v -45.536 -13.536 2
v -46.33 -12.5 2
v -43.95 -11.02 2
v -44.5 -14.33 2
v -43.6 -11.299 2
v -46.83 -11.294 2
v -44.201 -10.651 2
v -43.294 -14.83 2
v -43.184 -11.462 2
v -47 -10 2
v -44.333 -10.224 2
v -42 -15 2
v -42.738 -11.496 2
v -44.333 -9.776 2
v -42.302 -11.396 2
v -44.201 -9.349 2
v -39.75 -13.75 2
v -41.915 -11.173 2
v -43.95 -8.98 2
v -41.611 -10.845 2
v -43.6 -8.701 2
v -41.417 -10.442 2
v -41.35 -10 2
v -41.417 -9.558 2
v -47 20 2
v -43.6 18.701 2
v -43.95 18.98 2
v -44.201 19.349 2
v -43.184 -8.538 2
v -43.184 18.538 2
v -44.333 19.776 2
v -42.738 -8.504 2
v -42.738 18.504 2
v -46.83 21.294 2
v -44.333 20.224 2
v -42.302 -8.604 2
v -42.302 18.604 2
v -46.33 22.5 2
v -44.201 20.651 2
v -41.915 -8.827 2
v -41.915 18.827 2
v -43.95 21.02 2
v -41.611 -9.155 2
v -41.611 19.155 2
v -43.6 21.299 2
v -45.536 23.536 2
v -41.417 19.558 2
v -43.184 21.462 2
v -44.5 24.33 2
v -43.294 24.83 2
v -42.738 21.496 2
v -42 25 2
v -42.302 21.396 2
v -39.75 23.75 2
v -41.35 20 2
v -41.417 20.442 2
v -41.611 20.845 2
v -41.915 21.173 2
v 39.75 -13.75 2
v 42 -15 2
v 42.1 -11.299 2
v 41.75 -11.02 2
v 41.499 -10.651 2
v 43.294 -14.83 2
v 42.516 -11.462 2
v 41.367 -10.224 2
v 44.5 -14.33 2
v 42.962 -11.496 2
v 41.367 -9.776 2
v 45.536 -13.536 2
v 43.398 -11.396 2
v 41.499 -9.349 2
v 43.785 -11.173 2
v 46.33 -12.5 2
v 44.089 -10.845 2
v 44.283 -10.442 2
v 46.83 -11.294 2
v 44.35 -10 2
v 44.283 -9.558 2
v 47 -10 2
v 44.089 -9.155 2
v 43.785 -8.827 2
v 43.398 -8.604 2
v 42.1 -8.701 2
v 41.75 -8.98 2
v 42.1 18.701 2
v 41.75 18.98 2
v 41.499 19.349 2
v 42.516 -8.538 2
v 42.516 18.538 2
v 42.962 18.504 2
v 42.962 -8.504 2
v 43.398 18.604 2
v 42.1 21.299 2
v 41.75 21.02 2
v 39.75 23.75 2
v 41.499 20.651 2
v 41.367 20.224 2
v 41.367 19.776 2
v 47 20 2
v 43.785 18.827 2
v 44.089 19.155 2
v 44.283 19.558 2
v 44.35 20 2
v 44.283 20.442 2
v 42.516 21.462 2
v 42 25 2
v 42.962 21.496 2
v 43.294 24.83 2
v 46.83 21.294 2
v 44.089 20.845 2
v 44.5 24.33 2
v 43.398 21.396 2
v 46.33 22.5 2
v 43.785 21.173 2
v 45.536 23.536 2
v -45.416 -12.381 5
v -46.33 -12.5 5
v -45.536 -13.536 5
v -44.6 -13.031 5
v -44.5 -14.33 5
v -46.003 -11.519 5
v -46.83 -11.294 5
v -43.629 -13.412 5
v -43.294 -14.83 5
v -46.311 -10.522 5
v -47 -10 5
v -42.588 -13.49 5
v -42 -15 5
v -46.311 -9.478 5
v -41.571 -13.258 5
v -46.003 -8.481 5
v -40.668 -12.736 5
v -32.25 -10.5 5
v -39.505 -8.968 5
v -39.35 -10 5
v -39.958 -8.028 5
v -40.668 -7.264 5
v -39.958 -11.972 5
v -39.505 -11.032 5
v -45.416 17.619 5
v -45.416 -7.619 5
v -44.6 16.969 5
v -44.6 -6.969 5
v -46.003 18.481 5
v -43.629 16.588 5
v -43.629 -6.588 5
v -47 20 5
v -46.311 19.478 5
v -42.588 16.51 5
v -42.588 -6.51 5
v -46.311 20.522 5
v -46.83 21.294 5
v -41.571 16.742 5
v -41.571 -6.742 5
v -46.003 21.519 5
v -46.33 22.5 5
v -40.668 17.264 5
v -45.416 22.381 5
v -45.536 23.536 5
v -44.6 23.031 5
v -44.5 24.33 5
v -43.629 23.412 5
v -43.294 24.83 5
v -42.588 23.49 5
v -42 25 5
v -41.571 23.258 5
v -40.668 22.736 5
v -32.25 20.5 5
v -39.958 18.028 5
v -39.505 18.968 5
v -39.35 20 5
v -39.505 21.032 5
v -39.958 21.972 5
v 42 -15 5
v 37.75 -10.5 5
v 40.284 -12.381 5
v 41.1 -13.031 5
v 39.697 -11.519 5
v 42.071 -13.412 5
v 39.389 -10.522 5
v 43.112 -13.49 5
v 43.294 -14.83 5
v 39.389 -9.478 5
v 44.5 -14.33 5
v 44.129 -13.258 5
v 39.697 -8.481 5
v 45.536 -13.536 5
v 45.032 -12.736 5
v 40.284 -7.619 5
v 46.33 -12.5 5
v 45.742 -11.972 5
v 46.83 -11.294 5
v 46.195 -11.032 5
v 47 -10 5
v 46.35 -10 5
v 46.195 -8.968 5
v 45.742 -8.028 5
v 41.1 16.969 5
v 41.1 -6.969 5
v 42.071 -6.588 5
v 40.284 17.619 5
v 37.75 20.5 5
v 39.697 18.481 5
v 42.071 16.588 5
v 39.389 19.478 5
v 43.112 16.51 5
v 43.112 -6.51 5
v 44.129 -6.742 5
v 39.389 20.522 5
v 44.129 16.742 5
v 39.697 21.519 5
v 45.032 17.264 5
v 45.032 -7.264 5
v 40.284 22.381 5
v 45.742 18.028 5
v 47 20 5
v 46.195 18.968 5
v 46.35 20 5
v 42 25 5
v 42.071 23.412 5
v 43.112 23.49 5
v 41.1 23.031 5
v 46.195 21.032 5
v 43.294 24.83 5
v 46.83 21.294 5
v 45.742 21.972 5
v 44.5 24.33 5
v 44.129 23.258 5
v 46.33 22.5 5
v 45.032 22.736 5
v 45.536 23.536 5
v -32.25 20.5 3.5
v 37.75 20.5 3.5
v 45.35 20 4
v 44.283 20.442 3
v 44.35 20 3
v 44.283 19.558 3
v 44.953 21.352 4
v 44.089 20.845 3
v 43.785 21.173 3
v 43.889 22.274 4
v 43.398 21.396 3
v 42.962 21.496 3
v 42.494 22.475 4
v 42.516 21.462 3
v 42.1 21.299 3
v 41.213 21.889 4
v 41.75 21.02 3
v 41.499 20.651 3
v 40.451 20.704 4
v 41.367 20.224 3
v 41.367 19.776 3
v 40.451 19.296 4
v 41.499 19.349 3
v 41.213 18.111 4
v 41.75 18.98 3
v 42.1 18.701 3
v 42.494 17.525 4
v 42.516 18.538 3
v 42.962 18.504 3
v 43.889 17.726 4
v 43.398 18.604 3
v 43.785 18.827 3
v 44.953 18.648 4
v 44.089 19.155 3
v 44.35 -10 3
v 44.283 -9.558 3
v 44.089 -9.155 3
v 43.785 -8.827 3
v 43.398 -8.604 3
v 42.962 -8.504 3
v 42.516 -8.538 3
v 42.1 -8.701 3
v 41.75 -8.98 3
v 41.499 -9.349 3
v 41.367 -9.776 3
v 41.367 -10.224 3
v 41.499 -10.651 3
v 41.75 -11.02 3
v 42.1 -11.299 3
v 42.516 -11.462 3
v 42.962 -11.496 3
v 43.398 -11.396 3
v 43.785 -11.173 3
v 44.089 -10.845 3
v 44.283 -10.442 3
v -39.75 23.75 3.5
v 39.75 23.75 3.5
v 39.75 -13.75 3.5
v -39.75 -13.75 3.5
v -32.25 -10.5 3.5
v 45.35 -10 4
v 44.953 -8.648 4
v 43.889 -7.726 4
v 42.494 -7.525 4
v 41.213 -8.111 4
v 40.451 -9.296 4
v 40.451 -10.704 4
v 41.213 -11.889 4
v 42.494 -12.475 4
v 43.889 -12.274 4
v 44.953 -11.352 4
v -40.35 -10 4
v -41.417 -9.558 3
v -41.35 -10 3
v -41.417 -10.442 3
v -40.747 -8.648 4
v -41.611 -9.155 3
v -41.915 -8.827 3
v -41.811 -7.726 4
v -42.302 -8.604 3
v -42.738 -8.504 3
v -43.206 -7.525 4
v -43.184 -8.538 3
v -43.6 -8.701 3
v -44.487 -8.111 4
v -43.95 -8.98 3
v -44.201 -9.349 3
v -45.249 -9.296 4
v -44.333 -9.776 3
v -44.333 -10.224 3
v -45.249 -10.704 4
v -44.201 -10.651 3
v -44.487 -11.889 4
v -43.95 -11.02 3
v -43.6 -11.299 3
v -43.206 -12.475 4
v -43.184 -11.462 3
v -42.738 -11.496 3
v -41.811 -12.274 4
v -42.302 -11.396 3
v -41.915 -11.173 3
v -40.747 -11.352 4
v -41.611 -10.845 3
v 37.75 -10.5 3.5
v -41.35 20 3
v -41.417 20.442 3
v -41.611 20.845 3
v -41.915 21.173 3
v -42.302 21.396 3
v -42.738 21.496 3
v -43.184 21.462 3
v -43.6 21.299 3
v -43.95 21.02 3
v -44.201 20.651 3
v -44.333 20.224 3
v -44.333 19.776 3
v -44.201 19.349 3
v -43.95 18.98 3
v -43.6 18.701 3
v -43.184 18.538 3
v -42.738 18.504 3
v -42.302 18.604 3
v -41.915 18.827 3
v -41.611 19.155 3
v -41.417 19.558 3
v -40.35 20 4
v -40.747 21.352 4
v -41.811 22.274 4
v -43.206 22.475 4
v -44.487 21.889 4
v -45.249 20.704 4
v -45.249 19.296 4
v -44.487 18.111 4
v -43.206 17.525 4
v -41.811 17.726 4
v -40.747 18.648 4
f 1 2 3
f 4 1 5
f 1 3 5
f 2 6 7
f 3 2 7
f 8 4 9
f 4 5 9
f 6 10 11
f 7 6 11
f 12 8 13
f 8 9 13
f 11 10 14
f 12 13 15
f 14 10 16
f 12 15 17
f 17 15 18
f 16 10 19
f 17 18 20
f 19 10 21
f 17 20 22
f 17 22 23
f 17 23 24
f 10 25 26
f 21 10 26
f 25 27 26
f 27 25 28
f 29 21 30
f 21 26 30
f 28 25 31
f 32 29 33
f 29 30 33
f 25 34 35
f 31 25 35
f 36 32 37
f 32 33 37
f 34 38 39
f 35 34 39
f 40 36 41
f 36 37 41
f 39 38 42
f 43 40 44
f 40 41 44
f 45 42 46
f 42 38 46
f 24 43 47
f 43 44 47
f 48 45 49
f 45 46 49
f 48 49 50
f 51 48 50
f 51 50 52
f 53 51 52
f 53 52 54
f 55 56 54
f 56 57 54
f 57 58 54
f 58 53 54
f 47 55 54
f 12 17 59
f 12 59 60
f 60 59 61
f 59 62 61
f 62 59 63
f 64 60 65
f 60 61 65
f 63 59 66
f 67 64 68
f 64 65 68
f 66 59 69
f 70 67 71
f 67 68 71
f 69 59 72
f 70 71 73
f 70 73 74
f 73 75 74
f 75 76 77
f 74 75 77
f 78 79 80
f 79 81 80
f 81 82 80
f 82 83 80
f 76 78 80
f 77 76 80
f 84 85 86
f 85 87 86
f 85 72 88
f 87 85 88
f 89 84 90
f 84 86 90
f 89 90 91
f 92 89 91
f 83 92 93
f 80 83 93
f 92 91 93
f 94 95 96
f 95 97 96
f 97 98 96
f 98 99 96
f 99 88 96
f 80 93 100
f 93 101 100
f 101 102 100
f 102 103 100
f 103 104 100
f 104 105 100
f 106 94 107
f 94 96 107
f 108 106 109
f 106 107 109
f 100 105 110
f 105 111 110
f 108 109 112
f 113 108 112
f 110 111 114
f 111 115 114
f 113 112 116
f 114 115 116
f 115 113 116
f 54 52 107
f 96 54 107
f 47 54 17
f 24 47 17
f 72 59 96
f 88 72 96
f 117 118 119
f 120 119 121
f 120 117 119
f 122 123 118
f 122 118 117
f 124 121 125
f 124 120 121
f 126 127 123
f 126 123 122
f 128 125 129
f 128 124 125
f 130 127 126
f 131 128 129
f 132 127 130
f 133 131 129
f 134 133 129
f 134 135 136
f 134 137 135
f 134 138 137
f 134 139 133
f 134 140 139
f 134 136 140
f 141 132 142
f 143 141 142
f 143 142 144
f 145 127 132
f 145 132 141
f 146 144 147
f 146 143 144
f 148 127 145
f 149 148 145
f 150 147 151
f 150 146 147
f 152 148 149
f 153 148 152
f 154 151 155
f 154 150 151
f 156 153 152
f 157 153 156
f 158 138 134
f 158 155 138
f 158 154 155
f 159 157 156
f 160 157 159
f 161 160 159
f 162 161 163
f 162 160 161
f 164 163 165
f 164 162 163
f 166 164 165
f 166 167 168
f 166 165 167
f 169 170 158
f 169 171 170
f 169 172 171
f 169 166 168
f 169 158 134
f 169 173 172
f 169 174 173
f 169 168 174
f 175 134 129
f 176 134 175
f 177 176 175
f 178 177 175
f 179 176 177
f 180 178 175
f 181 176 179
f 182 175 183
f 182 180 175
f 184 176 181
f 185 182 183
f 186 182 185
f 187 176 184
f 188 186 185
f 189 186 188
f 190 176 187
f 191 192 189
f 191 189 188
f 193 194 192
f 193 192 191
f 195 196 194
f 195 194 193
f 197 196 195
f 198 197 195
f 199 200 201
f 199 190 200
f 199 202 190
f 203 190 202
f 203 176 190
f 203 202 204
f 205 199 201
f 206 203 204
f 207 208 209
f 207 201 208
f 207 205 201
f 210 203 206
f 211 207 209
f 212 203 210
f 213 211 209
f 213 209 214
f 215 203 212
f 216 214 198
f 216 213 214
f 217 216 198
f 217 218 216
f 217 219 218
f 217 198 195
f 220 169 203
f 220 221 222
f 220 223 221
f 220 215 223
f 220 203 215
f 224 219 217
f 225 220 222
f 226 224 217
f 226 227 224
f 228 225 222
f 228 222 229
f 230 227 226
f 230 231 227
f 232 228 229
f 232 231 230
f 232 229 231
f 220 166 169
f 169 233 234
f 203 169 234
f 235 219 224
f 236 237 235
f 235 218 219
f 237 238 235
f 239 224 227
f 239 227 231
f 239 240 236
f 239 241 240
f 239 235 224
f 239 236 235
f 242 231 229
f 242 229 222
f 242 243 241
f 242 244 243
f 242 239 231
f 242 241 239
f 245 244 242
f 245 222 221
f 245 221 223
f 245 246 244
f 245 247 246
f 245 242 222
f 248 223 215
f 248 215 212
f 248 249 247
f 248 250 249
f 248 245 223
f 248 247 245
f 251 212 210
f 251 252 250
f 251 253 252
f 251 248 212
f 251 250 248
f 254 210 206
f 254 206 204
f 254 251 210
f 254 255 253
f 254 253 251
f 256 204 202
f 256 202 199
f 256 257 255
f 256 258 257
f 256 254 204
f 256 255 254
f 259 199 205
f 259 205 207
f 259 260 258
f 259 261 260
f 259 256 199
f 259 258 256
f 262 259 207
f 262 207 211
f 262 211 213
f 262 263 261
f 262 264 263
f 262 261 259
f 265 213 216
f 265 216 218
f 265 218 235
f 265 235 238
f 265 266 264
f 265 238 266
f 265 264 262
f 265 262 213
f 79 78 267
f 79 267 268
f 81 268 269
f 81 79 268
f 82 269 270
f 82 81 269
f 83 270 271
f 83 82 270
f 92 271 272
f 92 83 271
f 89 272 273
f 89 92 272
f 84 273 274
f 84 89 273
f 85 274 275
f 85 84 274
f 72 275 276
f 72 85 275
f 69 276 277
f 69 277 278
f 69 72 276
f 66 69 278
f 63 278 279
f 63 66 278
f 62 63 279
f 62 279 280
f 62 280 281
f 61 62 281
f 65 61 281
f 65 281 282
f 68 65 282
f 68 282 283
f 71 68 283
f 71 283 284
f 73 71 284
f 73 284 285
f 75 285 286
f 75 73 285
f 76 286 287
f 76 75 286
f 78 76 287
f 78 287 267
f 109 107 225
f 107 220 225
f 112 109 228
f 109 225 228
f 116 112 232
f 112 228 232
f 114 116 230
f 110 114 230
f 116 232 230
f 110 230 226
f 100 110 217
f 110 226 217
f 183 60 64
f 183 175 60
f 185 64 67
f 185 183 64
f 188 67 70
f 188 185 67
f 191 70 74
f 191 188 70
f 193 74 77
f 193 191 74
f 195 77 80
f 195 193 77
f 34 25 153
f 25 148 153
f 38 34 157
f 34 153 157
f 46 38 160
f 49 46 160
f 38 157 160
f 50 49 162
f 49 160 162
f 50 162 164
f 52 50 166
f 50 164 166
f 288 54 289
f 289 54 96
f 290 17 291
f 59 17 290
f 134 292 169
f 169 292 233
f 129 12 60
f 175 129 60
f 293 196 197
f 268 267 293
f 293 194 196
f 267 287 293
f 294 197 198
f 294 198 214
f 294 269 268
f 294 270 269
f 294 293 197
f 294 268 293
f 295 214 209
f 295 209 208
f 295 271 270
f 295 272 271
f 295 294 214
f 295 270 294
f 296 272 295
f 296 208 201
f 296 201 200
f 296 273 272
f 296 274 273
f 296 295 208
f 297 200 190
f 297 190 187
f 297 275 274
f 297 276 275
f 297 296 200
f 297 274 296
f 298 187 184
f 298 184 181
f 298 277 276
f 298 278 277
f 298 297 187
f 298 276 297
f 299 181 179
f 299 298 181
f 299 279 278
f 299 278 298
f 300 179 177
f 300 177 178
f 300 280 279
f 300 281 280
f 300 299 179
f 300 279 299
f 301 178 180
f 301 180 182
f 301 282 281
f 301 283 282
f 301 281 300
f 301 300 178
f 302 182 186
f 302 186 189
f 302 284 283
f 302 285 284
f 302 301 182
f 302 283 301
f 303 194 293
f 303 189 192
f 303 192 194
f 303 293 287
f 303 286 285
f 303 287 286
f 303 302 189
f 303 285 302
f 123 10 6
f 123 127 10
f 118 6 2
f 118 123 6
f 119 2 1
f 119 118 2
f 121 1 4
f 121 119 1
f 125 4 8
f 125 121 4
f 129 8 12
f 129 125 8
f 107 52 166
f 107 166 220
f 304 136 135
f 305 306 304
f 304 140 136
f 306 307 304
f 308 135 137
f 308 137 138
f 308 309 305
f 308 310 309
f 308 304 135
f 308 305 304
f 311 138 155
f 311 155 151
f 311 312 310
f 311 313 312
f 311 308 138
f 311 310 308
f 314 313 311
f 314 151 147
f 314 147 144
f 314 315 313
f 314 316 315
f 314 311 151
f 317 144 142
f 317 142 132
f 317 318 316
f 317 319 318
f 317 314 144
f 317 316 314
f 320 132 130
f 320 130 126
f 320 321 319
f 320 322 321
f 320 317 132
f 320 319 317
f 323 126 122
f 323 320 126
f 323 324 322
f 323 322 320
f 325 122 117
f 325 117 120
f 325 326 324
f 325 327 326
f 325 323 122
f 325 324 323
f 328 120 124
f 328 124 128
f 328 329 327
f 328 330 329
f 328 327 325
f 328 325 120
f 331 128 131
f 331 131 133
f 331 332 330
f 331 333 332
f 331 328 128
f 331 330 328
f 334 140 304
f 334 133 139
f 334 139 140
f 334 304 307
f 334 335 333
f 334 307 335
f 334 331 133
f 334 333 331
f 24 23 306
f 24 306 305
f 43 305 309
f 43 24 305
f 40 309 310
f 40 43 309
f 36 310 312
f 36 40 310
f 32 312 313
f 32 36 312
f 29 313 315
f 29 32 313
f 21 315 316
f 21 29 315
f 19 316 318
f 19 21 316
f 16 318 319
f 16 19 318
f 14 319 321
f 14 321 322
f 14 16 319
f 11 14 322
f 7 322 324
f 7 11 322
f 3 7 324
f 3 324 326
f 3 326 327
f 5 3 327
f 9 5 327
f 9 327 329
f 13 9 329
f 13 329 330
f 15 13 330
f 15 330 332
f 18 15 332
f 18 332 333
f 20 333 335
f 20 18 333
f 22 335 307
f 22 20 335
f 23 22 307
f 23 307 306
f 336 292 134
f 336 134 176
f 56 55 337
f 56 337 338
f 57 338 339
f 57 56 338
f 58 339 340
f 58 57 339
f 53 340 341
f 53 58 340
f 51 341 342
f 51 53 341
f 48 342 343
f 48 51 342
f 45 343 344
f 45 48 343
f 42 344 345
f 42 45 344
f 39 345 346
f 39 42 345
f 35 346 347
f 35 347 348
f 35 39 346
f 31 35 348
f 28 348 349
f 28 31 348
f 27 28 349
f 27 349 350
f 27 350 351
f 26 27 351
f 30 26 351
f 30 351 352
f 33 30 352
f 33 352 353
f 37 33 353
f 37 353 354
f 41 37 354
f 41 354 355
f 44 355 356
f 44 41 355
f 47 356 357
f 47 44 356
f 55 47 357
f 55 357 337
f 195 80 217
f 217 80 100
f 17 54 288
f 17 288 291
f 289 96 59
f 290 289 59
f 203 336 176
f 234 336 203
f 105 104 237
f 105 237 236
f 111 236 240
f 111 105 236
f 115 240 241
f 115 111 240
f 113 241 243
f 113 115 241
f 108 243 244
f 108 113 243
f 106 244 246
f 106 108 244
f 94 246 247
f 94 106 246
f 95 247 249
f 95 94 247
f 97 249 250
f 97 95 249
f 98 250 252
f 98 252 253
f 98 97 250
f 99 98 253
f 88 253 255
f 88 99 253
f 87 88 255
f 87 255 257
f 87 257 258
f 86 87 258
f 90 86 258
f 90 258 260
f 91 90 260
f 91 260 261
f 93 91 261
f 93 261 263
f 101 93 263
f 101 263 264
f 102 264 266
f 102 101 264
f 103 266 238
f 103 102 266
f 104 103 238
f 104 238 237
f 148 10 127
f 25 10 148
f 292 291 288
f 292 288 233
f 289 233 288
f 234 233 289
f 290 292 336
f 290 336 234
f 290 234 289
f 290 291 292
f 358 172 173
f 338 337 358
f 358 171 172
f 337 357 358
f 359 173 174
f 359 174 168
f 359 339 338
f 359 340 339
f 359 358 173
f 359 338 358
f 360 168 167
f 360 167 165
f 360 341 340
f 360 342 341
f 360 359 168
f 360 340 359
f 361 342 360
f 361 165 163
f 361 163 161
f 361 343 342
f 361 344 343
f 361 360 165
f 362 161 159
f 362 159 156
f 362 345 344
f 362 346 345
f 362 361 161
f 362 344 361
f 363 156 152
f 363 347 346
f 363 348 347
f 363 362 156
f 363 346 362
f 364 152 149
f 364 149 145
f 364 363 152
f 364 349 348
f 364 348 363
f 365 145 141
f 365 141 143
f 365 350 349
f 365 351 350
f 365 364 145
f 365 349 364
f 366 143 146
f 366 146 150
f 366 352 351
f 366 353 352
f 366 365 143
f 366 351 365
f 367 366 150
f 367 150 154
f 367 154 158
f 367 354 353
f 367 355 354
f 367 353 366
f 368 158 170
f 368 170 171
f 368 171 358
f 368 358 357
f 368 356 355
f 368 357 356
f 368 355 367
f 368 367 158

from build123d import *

# Parameters (mm, degrees)
SKETCH001_W   = 94
SKETCH001_H   = 40
SKETCH001_R   = 1.5
SKETCH001_W_2 = 70
SKETCH001_H_2 = 31
PAD001_DEPTH  = 3
SKETCH002_W   = 79.5
SKETCH002_H   = 37.5
POCKET_DEPTH  = 1.5
FILLET_R      = 5
CHAMFER_SIZE  = 2


with BuildPart() as part:
    # Sketch001 → Pad001 (new body)
    with BuildSketch(Plane.XY):
        Rectangle(SKETCH001_W, SKETCH001_H)
        with Locations((-42.85, 15)):
            Circle(SKETCH001_R, mode=Mode.SUBTRACT)
        with Locations((-42.85, -15)):
            Circle(SKETCH001_R, mode=Mode.SUBTRACT)
        with Locations((42.85, 15)):
            Circle(SKETCH001_R, mode=Mode.SUBTRACT)
        with Locations((42.85, -15)):
            Circle(SKETCH001_R, mode=Mode.SUBTRACT)
        with Locations((2.75, 0)):
            Rectangle(SKETCH001_W_2, SKETCH001_H_2, mode=Mode.SUBTRACT)
    extrude(amount=PAD001_DEPTH)

    # Sketch002 (on Face13 of Pad001) → Pocket (cut)
    with BuildSketch(Plane(origin=(0, 0, 0), x_dir=(1, 0, 0), z_dir=(0, 0, -1))):
        Rectangle(SKETCH002_W, SKETCH002_H)
    extrude(amount=-POCKET_DEPTH, mode=Mode.SUBTRACT)

    # Fillet
    fillet_edges = [part.edges().sort_by_distance(p)[0] for p in [
        (-47, -20, 1.5),
        (-47, 20, 1.5),
        (47, -20, 1.5),
        (47, 20, 1.5),
    ]]
    fillet(fillet_edges, radius=FILLET_R)

    # Chamfer
    chamfer_edges = [part.edges().sort_by_distance(p)[0] for p in [
        (41.35, -15, 3),
        (41.35, 15, 3),
        (-44.35, -15, 3),
        (-44.35, 15, 3),
    ]]
    chamfer(chamfer_edges, length=CHAMFER_SIZE)


with BuildPart() as part_1:
    # Body001 placement: moved
    add(part.part.moved(Location((0, 5, 2))))


solid = part_1.part
